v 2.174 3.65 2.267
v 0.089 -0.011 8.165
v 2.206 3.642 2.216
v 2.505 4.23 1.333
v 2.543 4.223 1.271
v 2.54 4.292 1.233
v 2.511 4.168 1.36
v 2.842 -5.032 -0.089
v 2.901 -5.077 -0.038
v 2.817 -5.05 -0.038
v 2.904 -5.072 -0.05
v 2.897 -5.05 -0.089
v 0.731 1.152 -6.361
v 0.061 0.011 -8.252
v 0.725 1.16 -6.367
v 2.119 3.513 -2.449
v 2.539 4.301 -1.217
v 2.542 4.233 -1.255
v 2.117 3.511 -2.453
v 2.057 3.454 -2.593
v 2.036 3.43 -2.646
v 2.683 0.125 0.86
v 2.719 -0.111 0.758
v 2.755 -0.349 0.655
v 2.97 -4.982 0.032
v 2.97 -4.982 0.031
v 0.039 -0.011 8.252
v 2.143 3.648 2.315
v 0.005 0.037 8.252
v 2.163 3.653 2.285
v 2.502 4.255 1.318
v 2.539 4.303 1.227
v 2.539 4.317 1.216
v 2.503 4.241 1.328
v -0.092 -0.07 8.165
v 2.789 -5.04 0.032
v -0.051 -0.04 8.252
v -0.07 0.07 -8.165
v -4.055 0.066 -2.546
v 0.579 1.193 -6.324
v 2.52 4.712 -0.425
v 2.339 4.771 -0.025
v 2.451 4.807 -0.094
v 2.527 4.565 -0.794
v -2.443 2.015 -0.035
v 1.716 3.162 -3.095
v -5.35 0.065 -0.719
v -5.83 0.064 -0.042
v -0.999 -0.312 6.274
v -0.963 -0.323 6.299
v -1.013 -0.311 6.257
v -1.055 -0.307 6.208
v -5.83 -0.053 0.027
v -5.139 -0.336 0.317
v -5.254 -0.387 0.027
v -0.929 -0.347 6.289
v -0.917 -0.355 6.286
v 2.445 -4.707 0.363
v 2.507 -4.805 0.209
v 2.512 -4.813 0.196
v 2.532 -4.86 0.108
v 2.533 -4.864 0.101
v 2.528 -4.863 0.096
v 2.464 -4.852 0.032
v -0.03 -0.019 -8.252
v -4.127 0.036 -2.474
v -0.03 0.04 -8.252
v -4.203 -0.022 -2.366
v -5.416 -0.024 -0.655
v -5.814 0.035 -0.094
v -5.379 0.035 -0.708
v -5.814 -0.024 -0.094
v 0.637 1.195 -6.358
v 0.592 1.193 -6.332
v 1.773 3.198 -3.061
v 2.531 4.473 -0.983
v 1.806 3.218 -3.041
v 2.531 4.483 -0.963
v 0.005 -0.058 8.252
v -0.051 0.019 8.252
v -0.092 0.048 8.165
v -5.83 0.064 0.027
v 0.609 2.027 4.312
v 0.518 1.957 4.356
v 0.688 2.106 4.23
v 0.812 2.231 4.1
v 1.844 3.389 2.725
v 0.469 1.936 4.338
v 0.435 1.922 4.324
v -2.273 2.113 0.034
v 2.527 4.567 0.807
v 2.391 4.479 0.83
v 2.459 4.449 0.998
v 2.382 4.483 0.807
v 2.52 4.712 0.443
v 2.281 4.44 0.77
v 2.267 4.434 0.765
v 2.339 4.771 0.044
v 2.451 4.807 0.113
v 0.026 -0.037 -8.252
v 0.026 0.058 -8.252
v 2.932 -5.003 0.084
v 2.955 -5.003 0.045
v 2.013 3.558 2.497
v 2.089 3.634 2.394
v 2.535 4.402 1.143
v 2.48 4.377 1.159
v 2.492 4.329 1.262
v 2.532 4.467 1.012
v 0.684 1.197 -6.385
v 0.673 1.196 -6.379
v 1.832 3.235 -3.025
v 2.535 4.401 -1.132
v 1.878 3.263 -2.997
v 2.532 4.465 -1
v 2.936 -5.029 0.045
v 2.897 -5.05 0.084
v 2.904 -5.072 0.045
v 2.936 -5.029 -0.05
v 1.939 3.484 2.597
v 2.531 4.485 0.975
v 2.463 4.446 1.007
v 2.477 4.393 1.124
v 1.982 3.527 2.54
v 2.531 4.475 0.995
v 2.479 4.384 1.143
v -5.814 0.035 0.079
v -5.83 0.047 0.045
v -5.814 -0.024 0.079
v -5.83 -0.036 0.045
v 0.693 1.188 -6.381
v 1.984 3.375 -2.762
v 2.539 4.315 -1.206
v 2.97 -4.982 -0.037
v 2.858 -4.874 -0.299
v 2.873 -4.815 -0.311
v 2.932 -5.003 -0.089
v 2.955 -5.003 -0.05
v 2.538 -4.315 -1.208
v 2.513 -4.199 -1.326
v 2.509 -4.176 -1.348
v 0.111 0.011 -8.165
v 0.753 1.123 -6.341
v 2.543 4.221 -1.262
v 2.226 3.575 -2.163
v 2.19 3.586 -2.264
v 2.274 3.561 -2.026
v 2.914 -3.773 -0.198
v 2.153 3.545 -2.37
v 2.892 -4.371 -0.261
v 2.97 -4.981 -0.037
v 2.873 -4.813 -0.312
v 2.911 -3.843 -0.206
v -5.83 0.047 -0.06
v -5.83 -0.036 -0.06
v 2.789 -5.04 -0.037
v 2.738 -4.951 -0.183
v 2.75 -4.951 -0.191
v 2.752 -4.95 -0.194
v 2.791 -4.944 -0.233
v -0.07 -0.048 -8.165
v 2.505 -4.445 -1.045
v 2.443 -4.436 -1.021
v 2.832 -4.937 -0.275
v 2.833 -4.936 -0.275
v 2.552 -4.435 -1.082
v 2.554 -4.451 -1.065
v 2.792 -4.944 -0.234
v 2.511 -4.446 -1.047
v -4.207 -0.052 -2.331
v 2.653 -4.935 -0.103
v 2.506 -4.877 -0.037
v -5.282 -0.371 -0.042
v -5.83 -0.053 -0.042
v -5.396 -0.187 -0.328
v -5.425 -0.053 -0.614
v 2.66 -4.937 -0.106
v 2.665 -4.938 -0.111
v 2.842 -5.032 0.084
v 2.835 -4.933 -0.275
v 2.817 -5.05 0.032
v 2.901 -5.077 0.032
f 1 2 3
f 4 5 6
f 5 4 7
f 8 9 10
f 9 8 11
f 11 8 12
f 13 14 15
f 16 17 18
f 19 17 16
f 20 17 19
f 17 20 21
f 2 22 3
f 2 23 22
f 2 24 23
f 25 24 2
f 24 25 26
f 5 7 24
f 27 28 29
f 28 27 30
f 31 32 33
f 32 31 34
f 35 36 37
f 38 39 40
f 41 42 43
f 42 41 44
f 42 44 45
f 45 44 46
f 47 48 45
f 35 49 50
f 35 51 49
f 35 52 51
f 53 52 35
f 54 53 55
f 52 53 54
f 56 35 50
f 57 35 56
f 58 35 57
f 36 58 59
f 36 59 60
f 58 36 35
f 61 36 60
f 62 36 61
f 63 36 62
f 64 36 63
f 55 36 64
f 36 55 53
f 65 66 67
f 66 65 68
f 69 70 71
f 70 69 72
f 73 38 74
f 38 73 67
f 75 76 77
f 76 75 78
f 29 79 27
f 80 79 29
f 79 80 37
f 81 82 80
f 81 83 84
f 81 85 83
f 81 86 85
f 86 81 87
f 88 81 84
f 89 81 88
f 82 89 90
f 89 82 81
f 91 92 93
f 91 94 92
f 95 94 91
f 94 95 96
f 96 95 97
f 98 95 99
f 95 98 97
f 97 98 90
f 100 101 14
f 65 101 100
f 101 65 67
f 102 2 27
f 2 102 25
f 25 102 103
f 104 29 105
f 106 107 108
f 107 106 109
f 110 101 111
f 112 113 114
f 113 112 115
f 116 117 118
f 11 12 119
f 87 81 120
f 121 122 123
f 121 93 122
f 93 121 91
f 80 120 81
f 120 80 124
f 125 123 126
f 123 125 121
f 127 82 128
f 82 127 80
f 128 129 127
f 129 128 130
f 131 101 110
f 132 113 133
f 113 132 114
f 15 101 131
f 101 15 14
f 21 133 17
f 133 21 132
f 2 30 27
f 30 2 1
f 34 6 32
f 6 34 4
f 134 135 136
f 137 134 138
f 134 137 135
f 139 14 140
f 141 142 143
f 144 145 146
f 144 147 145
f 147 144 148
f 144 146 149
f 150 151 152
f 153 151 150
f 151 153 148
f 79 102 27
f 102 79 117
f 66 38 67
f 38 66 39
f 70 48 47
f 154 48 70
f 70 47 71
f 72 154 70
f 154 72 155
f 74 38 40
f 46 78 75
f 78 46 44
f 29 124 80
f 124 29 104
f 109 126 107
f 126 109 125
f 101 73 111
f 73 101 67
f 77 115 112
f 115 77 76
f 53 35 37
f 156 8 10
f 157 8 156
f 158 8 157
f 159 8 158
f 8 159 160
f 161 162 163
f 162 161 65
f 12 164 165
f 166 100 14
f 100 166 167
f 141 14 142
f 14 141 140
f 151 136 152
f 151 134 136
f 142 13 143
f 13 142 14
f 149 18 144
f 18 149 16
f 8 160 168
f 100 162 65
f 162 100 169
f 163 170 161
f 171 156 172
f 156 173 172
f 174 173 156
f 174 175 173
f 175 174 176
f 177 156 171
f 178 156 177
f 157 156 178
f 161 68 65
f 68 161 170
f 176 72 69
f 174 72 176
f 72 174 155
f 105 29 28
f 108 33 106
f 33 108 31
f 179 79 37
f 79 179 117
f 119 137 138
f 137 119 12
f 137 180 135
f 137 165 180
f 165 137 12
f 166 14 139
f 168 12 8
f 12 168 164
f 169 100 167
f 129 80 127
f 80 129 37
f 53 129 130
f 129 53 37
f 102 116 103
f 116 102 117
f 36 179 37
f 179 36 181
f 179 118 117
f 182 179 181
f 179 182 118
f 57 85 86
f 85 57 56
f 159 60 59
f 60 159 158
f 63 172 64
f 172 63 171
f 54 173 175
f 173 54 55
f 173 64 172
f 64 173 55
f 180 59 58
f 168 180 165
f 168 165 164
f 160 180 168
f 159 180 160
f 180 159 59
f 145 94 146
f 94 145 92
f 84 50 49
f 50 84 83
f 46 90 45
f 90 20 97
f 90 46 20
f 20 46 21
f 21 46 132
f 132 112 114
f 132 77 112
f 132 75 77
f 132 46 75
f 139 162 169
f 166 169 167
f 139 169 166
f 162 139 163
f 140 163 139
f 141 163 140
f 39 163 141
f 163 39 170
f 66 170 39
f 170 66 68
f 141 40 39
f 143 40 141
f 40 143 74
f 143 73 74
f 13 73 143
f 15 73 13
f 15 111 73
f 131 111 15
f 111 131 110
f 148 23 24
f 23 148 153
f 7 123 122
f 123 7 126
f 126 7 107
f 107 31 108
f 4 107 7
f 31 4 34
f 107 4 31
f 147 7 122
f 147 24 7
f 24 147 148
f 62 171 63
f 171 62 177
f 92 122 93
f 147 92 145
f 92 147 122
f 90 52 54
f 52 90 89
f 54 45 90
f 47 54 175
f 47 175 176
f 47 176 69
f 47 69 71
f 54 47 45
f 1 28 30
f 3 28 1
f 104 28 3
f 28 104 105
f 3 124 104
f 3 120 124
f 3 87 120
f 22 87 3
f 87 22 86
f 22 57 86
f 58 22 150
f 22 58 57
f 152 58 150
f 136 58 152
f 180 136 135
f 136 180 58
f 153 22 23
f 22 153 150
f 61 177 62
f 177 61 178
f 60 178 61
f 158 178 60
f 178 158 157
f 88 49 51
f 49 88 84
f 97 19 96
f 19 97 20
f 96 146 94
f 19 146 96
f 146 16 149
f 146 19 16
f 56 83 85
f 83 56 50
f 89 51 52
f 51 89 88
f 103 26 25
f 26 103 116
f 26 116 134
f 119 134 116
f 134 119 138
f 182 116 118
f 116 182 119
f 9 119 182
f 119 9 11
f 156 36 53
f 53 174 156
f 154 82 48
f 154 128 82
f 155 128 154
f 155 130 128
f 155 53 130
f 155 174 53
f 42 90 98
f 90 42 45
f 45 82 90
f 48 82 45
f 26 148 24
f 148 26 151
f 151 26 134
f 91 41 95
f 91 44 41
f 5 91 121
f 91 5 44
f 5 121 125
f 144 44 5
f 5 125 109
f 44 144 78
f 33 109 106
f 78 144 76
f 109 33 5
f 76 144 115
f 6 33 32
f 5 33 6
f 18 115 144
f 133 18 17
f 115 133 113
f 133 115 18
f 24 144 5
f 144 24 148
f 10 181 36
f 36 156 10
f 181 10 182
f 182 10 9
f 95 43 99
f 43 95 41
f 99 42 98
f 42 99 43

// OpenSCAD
// Auto-generated OpenSCAD file

    inner_points = 10*[[0.1821393068757838, 0.1913870506433806, -0.766553282190714], [-0.21273894850983668, -0.20901536236239762, 0.766553282190714], [-0.5749142746609799, 0.0005416474787896391, -0.14169497283306184], [0.24202588352164686, 0.471177062130277, 0.19163832047015342], [0.2869889286882537, -0.4981611771875922, -0.0499433476370916]];

    outer_points = 10*[[-0.0010710062446377955, -0.001087881755346909, 0.8164951537673552], [0.0010710062446377955, 0.001087881755346909, -0.8164951537673552], [-0.5773495172173777, 0.0005439408776734544, -0.0007565913797176194], [0.2882045658240988, -0.5002713047271171, -0.0002885101452453076], [0.2891449513932788, 0.49972736384944366, 0.001045101524962927]];

    // Convex hull for inner set (I)
    module inner_hull() {
        hull() {
            for (p = inner_points) {
                translate(p) sphere(r=0.1);
            }
        }
    }

    // Convex hull for outer set (O) minus inner hull (O \ I)
    module outer_minus_inner() {
        difference() {
            hull() {
                for (p = outer_points) {
                    translate(p) sphere(r=0.1);
                }
            }
            inner_hull(); // Subtract inner hull
        }
    }

    // Convex hull for outer set (O) minus all translated inner hulls
    module outer_minus_AllTranslationInner() {
        difference() {
            hull() {
                for (p = outer_points) {
                    translate(p) sphere(r=0.1);
                }
            }
            hull() {
                translate([0,0,50]) inner_hull();
                translate([0,0,-50]) inner_hull();
            }; // Subtract translated inner hulls
        }
    }

    // Difference between outer_minus_inner and outer_minus_AllTranslationInner
    module outer_minus_inner_diff() {
        difference() {
            // Outer minus inner
            difference() {
                hull() {
                    for (p = outer_points) {
                        translate(p) sphere(r=0.1);
                    }
                }
                inner_hull();
            }

            // Subtract Outer minus AllTranslationInner
            difference() {
                hull() {
                    for (p = outer_points) {
                        translate(p) sphere(r=0.1);
                    }
                }
                hull() {
                    translate([0,0,50]) inner_hull();
                    translate([0,0,-50]) inner_hull();
                };
            }
        }
    }

    // Rendering all with colors applied
    color([1, 1, 0, 1]) outer_minus_inner_diff(); // Opaque yellow
    
